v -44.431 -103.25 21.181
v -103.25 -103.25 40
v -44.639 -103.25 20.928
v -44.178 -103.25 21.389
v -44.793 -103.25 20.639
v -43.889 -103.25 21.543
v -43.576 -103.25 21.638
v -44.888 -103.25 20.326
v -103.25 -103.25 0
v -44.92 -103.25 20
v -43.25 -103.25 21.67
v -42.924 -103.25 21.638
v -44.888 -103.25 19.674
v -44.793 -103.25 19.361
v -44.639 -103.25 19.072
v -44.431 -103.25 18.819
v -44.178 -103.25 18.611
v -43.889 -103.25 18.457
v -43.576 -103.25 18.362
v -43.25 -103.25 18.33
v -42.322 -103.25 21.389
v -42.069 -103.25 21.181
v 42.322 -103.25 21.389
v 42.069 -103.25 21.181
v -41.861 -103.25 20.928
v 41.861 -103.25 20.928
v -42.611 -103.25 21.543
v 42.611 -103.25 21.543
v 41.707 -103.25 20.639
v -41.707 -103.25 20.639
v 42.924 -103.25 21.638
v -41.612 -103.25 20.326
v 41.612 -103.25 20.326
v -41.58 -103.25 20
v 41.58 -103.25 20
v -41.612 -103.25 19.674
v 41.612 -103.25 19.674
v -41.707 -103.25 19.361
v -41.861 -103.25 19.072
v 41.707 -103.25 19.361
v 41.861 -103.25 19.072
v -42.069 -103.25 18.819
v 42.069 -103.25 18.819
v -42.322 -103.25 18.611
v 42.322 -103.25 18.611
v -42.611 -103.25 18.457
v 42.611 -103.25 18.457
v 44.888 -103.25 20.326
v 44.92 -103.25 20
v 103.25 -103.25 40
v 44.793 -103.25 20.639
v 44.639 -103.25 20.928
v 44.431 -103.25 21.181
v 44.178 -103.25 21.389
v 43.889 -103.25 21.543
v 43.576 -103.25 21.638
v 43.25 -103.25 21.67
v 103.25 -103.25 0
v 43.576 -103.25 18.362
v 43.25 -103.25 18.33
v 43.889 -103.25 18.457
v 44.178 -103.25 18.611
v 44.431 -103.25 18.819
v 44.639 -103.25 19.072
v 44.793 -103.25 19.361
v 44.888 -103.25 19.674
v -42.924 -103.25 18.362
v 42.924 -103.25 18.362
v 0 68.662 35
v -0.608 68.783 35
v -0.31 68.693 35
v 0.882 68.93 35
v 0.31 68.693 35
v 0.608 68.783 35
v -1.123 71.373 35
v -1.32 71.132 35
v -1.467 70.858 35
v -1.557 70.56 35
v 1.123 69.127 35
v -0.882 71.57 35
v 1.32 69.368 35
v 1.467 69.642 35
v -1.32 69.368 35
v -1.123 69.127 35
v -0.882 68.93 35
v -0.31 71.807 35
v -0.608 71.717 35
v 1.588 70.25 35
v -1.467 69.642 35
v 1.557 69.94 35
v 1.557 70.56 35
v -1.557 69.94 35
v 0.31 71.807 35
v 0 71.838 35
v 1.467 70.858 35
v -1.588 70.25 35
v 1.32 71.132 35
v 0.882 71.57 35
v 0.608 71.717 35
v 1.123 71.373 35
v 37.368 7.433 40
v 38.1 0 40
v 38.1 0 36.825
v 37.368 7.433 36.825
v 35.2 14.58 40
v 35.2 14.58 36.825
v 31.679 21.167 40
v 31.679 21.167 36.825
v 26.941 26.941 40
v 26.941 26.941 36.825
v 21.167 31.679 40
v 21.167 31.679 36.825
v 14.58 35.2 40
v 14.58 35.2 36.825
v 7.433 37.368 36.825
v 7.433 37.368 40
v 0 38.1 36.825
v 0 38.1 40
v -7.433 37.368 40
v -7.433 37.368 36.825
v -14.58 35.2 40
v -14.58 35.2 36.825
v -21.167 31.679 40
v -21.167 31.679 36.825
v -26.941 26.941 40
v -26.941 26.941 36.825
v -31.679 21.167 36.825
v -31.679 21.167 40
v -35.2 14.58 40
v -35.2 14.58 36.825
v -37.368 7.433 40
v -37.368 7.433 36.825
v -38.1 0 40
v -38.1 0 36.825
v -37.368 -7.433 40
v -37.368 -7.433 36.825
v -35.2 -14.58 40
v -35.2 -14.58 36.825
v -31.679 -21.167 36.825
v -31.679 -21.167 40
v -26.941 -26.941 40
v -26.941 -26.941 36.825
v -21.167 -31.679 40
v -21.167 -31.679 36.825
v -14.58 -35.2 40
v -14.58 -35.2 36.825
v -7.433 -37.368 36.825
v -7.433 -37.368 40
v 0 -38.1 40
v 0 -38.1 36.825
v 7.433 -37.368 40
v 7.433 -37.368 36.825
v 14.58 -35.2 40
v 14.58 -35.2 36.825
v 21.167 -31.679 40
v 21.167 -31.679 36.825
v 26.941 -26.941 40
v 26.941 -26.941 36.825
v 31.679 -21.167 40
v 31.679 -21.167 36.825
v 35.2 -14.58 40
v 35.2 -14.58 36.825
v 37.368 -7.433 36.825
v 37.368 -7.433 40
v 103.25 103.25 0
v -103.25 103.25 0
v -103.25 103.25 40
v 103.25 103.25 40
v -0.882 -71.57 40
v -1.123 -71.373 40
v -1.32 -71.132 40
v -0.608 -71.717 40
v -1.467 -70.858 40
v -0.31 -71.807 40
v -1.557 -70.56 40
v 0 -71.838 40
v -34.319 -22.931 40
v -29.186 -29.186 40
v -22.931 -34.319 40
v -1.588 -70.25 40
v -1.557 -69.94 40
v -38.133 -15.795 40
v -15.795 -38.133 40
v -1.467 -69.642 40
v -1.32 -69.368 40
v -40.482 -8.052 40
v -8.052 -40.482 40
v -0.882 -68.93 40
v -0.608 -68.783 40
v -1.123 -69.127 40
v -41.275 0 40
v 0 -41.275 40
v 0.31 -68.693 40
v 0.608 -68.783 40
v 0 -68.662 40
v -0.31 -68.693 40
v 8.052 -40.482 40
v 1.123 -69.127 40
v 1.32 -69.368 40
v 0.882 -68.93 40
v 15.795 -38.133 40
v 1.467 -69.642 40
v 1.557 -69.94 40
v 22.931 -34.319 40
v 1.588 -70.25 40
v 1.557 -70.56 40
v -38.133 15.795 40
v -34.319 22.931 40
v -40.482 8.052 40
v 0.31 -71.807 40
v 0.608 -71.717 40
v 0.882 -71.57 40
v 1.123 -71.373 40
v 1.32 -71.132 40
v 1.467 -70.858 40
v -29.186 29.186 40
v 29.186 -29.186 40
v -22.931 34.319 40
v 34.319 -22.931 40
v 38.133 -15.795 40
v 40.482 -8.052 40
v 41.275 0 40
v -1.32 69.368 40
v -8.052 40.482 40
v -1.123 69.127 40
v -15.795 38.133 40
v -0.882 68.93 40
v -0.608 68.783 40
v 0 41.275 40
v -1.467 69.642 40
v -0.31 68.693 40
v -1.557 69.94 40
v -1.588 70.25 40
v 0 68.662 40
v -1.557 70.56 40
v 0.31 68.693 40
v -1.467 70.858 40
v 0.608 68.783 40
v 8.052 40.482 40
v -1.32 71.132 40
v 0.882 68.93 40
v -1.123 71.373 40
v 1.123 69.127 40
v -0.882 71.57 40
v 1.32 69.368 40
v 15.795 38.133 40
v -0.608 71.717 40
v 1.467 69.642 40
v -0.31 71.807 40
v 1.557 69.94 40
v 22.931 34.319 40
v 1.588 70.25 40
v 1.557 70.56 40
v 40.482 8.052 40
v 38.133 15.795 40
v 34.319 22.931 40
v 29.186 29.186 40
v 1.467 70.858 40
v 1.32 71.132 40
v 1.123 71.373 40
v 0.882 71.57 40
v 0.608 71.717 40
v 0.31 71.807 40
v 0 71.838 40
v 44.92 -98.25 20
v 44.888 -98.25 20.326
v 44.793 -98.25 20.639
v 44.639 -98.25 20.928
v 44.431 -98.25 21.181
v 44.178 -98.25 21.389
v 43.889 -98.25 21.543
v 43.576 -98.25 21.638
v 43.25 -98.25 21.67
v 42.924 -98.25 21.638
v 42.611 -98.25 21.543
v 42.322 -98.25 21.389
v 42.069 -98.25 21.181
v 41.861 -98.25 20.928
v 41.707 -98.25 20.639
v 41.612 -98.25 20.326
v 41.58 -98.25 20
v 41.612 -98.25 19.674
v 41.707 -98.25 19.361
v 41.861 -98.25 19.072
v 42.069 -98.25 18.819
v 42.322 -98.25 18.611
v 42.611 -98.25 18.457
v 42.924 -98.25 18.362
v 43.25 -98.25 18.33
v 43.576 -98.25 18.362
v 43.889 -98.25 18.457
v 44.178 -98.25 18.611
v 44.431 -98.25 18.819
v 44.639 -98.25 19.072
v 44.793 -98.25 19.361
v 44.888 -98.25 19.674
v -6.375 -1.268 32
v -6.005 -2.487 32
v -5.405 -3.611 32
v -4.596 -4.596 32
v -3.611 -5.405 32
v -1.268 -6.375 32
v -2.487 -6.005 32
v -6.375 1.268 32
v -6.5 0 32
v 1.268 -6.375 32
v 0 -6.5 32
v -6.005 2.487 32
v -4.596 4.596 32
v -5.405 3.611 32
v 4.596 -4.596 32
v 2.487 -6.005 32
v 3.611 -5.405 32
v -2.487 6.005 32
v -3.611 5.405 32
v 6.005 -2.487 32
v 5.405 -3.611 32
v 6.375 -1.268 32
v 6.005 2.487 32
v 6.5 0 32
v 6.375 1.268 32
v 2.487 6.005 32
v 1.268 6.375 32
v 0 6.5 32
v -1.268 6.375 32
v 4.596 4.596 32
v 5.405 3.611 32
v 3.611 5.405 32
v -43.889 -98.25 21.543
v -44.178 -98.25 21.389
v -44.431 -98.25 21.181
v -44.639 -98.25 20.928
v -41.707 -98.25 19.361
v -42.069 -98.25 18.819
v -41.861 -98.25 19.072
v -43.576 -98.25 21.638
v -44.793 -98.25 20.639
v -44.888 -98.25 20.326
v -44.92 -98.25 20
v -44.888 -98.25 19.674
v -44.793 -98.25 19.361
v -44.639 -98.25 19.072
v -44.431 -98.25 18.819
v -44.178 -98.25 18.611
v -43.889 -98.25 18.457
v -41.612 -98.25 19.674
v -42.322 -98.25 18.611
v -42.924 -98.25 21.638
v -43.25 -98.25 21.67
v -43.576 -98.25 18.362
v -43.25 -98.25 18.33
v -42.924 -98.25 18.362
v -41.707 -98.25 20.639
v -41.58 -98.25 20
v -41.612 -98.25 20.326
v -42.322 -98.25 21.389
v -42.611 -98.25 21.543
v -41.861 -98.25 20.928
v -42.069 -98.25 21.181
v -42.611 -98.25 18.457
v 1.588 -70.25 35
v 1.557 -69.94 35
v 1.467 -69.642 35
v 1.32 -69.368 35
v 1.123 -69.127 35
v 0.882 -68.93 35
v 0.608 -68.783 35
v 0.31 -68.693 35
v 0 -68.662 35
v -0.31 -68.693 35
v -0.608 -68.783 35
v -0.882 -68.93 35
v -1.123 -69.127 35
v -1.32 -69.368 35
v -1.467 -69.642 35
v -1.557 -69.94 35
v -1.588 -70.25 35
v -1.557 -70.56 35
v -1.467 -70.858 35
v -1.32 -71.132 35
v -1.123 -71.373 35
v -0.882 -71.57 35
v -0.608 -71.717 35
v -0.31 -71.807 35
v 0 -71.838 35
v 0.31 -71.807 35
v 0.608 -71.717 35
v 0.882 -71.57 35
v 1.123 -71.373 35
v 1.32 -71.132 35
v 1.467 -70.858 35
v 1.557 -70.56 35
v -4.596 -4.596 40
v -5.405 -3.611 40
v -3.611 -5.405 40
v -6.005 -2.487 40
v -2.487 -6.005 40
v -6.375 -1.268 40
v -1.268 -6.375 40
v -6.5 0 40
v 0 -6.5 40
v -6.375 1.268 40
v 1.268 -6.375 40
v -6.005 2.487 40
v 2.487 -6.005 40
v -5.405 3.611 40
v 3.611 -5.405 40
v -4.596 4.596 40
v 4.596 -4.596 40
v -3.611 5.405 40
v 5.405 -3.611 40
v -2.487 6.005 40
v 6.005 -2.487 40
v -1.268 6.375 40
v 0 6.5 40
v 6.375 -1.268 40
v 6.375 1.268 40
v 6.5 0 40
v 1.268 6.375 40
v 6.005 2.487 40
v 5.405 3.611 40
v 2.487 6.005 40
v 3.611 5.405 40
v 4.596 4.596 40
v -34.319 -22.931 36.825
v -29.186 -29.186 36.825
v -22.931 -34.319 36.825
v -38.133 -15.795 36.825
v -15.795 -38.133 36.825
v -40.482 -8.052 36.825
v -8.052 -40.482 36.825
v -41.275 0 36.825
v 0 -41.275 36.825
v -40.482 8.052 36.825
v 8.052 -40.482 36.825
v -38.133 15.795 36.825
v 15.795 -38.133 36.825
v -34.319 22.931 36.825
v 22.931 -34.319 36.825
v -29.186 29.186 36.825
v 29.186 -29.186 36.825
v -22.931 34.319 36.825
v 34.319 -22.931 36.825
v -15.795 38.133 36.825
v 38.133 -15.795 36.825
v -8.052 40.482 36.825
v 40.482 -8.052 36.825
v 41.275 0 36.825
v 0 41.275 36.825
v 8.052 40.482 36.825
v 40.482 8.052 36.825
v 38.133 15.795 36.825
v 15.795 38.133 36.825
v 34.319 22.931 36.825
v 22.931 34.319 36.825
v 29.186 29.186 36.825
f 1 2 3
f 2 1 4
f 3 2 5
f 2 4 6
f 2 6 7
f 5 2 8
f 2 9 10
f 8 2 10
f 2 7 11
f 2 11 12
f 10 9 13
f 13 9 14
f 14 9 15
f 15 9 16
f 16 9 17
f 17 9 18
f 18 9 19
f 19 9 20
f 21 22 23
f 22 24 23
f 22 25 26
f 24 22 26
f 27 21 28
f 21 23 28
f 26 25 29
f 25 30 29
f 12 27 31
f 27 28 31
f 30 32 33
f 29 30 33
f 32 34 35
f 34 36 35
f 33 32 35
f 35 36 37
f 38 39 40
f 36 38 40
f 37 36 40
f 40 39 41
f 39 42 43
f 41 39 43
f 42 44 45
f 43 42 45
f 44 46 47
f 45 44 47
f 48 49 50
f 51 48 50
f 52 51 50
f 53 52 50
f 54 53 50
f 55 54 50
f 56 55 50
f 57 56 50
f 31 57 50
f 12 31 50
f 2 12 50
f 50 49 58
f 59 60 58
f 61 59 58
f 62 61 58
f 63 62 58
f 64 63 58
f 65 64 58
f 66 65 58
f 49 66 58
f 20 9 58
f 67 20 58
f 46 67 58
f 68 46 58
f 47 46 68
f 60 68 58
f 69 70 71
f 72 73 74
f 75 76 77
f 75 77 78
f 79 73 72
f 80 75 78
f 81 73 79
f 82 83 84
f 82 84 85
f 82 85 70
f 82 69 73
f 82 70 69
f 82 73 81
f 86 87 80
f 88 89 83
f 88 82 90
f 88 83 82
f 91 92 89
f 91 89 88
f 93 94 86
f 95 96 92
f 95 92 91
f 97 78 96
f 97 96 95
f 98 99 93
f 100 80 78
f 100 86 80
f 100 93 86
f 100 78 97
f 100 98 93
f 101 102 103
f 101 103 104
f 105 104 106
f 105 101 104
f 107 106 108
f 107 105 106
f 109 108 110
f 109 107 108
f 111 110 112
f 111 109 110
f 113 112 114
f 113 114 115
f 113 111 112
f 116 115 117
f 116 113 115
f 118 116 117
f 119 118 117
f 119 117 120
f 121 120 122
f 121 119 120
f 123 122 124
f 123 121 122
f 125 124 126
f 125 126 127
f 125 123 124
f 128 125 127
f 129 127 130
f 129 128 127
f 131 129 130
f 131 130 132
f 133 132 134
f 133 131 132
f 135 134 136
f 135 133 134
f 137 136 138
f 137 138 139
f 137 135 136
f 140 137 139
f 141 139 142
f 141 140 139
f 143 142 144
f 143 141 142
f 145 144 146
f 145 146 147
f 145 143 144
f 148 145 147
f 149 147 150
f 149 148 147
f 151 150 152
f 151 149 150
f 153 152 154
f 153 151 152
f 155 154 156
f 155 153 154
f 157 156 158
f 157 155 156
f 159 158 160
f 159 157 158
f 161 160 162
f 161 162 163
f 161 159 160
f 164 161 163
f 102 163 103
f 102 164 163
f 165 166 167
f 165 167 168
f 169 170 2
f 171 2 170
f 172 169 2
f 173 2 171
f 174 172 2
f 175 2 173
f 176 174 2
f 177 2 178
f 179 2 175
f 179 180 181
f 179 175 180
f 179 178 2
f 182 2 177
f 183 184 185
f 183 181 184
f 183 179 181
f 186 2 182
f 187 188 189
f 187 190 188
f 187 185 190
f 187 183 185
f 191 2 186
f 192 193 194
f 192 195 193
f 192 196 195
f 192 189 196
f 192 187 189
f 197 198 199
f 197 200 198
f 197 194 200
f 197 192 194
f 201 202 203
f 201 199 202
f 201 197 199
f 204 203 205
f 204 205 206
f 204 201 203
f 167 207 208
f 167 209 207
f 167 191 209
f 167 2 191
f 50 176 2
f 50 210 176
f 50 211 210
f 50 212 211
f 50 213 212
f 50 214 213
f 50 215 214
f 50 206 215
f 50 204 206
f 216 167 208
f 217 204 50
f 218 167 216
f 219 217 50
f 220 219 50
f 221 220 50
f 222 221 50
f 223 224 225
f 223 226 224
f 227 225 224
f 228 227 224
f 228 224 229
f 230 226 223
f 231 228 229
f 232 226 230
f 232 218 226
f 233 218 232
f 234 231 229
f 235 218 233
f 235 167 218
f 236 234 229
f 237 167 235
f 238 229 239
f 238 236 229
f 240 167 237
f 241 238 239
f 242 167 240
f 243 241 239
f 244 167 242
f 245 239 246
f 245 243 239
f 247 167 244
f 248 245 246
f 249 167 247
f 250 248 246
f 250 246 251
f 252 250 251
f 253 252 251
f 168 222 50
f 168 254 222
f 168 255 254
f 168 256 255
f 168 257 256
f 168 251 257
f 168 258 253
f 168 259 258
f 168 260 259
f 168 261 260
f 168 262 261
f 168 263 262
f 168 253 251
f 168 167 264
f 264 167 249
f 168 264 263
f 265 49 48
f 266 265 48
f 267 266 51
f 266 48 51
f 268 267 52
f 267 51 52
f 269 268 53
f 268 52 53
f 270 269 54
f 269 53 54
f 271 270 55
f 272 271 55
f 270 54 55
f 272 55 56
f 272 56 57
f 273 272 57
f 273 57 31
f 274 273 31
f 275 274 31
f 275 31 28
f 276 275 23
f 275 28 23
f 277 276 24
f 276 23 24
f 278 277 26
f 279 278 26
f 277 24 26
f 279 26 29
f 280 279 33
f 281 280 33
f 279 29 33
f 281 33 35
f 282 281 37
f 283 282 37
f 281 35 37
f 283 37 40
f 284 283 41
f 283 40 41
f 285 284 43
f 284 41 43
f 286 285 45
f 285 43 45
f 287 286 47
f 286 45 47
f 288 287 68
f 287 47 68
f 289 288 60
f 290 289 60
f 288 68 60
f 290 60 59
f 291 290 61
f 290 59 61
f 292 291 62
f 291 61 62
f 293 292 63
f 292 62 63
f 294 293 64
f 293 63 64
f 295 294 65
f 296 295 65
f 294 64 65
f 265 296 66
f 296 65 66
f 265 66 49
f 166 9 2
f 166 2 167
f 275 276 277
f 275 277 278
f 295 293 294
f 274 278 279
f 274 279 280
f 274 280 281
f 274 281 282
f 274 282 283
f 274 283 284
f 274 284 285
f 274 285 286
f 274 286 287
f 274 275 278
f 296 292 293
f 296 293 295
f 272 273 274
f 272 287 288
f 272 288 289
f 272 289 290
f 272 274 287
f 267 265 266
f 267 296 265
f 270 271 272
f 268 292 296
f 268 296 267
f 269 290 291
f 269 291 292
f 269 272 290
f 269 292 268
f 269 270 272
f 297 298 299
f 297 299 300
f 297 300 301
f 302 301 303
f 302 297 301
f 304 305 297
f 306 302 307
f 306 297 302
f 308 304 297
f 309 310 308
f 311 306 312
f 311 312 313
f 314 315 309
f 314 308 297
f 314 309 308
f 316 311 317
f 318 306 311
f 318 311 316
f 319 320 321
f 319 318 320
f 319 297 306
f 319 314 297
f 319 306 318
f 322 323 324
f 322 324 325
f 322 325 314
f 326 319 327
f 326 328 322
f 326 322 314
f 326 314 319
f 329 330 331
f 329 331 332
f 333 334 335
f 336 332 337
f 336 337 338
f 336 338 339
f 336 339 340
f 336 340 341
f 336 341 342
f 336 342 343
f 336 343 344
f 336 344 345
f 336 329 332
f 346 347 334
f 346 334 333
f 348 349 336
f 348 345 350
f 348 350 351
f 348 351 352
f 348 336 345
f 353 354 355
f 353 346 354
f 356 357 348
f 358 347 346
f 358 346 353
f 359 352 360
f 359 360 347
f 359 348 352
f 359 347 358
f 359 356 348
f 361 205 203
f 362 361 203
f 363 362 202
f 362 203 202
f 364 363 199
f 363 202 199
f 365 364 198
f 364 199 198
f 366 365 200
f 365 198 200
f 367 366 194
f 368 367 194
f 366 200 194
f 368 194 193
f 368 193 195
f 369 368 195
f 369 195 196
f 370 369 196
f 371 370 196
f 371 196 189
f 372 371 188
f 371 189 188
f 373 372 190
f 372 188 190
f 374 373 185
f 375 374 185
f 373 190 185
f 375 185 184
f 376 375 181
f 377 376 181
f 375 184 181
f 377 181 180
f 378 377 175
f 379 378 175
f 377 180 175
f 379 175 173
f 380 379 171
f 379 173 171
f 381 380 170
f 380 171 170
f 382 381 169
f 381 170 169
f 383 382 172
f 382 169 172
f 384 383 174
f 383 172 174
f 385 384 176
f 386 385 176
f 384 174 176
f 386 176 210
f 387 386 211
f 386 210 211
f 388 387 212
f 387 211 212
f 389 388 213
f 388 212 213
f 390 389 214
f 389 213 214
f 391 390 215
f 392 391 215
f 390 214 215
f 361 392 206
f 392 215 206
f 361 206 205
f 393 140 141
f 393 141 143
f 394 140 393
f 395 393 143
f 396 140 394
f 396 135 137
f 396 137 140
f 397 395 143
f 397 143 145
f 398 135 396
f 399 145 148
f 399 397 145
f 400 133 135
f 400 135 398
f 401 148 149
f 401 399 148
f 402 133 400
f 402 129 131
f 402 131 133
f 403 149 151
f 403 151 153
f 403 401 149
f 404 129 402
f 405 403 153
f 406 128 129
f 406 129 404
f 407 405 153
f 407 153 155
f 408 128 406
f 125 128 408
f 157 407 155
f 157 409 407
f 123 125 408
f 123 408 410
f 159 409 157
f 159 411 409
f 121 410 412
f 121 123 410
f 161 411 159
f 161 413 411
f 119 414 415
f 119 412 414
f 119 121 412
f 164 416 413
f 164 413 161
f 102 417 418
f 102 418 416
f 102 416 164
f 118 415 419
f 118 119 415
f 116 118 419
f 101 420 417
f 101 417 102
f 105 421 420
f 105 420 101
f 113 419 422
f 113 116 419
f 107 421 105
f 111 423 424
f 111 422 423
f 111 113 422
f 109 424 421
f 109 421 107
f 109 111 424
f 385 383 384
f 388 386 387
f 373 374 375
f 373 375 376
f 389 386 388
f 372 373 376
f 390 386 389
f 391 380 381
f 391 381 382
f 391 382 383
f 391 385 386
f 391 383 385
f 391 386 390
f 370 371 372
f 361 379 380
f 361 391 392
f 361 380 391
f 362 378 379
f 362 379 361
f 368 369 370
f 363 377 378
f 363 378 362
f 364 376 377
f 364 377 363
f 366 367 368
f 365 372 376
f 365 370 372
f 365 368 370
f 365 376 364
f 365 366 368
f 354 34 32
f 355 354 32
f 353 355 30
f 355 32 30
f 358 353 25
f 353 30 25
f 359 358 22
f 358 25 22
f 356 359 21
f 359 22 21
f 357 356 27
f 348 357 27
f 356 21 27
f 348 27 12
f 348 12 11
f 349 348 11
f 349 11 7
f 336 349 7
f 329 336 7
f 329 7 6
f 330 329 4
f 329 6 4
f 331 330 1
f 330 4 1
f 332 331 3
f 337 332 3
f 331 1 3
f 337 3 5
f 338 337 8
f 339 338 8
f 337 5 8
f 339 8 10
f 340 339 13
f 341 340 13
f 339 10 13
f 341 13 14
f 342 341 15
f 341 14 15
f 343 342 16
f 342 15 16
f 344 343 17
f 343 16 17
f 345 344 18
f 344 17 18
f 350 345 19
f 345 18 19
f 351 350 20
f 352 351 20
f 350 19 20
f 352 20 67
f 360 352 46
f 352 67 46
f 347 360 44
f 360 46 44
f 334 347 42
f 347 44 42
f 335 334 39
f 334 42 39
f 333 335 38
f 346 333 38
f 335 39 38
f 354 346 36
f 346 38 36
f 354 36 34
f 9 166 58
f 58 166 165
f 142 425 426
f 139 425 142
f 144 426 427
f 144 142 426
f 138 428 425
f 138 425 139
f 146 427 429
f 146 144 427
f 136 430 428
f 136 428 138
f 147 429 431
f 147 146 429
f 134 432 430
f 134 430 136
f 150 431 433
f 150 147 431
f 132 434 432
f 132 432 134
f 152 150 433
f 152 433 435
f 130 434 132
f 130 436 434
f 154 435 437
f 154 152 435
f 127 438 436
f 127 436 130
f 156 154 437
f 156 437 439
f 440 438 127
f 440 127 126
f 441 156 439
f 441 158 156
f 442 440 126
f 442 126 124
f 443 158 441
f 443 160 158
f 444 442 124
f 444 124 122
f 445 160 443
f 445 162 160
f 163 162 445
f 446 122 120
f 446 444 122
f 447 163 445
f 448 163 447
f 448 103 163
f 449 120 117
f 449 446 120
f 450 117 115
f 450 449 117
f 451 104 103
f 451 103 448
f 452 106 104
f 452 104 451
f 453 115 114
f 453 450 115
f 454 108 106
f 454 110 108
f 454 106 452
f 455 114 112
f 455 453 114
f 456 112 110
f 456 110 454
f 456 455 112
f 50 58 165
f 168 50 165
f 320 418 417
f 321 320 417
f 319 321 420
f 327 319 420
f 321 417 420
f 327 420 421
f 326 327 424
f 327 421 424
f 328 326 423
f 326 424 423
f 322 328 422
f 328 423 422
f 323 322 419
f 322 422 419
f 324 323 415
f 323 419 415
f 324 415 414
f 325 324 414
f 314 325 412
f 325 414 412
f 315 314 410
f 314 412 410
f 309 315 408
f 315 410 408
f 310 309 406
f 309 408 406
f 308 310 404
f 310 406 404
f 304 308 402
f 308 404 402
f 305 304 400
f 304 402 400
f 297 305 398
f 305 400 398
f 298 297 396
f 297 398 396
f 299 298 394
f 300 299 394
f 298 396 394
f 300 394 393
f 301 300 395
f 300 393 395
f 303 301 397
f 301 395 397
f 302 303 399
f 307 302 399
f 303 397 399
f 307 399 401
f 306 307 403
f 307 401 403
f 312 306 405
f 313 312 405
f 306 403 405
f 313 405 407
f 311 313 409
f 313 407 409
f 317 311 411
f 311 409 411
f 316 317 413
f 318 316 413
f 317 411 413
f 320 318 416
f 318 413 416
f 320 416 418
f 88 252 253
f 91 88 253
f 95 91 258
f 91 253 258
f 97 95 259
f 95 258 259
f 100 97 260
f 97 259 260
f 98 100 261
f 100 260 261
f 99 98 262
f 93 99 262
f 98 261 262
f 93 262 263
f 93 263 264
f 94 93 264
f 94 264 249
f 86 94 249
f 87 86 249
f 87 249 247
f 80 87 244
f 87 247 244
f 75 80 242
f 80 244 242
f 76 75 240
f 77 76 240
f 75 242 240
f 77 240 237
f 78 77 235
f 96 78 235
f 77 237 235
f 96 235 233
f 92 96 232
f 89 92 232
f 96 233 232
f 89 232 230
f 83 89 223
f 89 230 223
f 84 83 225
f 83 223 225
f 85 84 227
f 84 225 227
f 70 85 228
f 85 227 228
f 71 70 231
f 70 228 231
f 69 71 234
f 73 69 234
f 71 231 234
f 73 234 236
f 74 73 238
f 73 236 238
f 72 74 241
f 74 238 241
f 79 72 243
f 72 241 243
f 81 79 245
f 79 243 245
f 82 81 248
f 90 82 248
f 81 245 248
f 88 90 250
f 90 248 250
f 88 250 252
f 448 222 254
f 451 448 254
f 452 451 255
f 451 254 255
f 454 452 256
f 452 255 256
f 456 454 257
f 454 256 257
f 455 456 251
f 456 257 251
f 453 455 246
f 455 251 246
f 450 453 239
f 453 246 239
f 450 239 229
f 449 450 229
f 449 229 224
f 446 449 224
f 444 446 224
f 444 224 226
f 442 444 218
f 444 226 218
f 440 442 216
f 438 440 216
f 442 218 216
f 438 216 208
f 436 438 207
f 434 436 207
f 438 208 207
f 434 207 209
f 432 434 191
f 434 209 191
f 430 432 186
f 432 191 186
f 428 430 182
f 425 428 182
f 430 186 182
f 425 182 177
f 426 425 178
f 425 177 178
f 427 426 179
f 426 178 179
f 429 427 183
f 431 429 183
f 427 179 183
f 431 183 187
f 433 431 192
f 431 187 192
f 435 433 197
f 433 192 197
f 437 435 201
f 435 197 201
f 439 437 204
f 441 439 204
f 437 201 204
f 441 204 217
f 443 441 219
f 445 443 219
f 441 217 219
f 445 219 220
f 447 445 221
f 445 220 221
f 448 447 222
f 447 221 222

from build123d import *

# Parameters (mm, degrees)
F0_W     = 206.5
F0_H     = 206.5
F1_DEPTH = 40
F2_R     = 41.275
F2_R_2   = 38.1
F3_DEPTH = 3.175
F4_R     = 6.5
F5_DEPTH = 8
F6_R     = 1.5875
F8_DEPTH = 5
F7_R     = 1.67005
F9_DEPTH = 5


with BuildPart() as f1:
    # F0 (on Top) → F1 (new body)
    with BuildSketch(Plane.XY):
        Rectangle(F0_W, F0_H)
    extrude(amount=F1_DEPTH)

    # F2 (on face) → F3 (cut)
    with BuildSketch(Plane.XY.offset(40)):
        Circle(F2_R)
        Circle(F2_R_2, mode=Mode.SUBTRACT)
    extrude(amount=-F3_DEPTH, mode=Mode.SUBTRACT)

    # F4 (on face) → F5 (cut)
    with BuildSketch(Plane.XY.offset(40)):
        Circle(F4_R)
    extrude(amount=-F5_DEPTH, mode=Mode.SUBTRACT)

    # F6 (on face) → F8 (cut)
    with BuildSketch(Plane.XY.offset(40)):
        with Locations((0, 70.25)):
            Circle(F6_R)
        with Locations((0, -70.25)):
            Circle(F6_R)
    extrude(amount=-F8_DEPTH, mode=Mode.SUBTRACT)

    # F7 (on face) → F9 (cut)
    with BuildSketch(Plane.XZ.offset(103.25)):
        with Locations((-43.25, 20)):
            Circle(F7_R)
        with Locations((43.25, 20)):
            Circle(F7_R)
    extrude(amount=-F9_DEPTH, mode=Mode.SUBTRACT)


solid = f1.part
